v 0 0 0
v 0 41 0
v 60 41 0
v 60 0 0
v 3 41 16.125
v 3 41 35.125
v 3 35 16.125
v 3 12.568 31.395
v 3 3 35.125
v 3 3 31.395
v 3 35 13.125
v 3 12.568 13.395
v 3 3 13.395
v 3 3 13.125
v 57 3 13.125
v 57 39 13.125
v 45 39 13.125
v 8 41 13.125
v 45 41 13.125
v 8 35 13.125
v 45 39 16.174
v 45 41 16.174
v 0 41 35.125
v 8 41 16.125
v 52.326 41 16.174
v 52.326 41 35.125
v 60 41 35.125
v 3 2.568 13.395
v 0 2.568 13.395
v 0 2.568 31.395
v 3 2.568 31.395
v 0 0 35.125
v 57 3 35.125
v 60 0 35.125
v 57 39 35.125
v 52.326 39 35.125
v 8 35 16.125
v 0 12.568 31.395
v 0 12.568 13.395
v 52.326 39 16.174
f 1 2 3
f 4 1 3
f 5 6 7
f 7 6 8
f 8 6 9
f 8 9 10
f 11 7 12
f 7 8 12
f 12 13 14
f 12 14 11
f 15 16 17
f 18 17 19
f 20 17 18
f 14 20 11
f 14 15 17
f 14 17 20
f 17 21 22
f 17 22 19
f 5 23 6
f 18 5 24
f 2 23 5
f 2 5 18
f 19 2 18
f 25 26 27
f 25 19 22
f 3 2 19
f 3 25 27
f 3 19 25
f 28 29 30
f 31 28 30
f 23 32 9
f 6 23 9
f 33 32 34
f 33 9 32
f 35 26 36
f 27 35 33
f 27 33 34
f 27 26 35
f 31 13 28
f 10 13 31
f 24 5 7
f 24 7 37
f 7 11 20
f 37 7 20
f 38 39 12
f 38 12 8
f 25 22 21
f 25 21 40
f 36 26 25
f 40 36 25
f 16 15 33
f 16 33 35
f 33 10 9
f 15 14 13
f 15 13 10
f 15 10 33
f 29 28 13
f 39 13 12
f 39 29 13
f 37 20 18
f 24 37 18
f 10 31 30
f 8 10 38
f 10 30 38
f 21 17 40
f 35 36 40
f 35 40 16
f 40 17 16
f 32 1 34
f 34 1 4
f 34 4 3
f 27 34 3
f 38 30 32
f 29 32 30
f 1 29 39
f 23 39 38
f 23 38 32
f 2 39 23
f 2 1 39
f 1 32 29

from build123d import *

# Parameters (mm, degrees)
ESQUISSE1_W             = 60
ESQUISSE1_H             = 42
BOSS_EXTRU_1_DEPTH      = 35.125
COQUE4_T                = -3
ESQUISSE7_W             = 54
ESQUISSE7_H             = 36
BOSS_EXTRU_2_DEPTH      = 10.125
ESQUISSE8_W             = 60
ESQUISSE8_H             = 35.125
ENL_V_MAT_EXTRU_1_DEPTH = 1
ESQUISSE9_W             = 10
ESQUISSE9_H             = 22
BOSS_EXTRU_3_DEPTH      = 1
ESQUISSE10_W            = 18
ESQUISSE10_H            = 10
ENL_V_MAT_EXTRU_2_DEPTH = 3
ESQUISSE13_W            = 42
ESQUISSE13_H            = 22
ENL_V_MAT_EXTRU_3_DEPTH = 10
ESQUISSE15_W            = 7.326333239
ESQUISSE15_H            = 18.950794871
ENL_V_MAT_EXTRU_4_DEPTH = 4
ESQUISSE16_W            = 5
ESQUISSE16_H            = 6
BOSS_EXTRU_4_DEPTH      = 3


with BuildPart() as part:
    # Esquisse1 → Boss.-Extru.1 (new body)
    with BuildSketch(Plane.XY):
        with Locations((30, 21)):
            Rectangle(ESQUISSE1_W, ESQUISSE1_H)
    extrude(amount=BOSS_EXTRU_1_DEPTH)

    # Coque4
    coque4_openings = [part.faces().sort_by_distance(p)[0] for p in [
        (30, 21, 35.125),
    ]]
    offset(amount=COQUE4_T, openings=coque4_openings, kind=Kind.INTERSECTION)

    # Esquisse7 → Boss.-Extru.2 (add)
    with BuildSketch(Plane.XY.offset(3)):
        with Locations((30, 21)):
            Rectangle(ESQUISSE7_W, ESQUISSE7_H)
    extrude(amount=BOSS_EXTRU_2_DEPTH)

    # Esquisse8 → Enlèv. mat.-Extru.1 (cut)
    with BuildSketch(Plane(origin=(0, 42, 0), x_dir=(1, 0, 0), z_dir=(0, 1, 0))):
        with Locations((30, -17.5625)):
            Rectangle(ESQUISSE8_W, ESQUISSE8_H)
    extrude(amount=-ENL_V_MAT_EXTRU_1_DEPTH, mode=Mode.SUBTRACT)

    # Esquisse9 → Boss.-Extru.3 (add)
    with BuildSketch(Plane(origin=(0, 41, 0), x_dir=(1, 0, 0), z_dir=(0, 1, 0))):
        with Locations((55, -24.125)):
            Rectangle(ESQUISSE9_W, ESQUISSE9_H)
    extrude(amount=-BOSS_EXTRU_3_DEPTH)

    # Esquisse10 → Enlèv. mat.-Extru.2 (cut)
    with BuildSketch(Plane.ZY):
        with Locations((22.395110195, 7.568318588)):
            Rectangle(ESQUISSE10_W, ESQUISSE10_H)
    extrude(amount=-ENL_V_MAT_EXTRU_2_DEPTH, mode=Mode.SUBTRACT)

    # Esquisse13 → Enlèv. mat.-Extru.3 (cut)
    with BuildSketch(Plane(origin=(0, 39, 0), x_dir=(-1, 0, 0), z_dir=(0, -1, 0))):
        with Locations((-24, -24.125)):
            Rectangle(ESQUISSE13_W, ESQUISSE13_H)
    extrude(amount=-ENL_V_MAT_EXTRU_3_DEPTH, mode=Mode.SUBTRACT)

    # Esquisse15 → Enlèv. mat.-Extru.4 (cut)
    with BuildSketch(Plane(origin=(0, 41, 0), x_dir=(1, 0, 0), z_dir=(0, 1, 0))):
        with Locations((48.66316662, -25.649602565)):
            Rectangle(ESQUISSE15_W, ESQUISSE15_H)
    extrude(amount=-ENL_V_MAT_EXTRU_4_DEPTH, mode=Mode.SUBTRACT)

    # Esquisse16 → Boss.-Extru.4 (add)
    with BuildSketch(Plane.XY.offset(13.125)):
        with Locations((5.5, 38)):
            Rectangle(ESQUISSE16_W, ESQUISSE16_H)
    extrude(amount=BOSS_EXTRU_4_DEPTH)


solid = part.part
